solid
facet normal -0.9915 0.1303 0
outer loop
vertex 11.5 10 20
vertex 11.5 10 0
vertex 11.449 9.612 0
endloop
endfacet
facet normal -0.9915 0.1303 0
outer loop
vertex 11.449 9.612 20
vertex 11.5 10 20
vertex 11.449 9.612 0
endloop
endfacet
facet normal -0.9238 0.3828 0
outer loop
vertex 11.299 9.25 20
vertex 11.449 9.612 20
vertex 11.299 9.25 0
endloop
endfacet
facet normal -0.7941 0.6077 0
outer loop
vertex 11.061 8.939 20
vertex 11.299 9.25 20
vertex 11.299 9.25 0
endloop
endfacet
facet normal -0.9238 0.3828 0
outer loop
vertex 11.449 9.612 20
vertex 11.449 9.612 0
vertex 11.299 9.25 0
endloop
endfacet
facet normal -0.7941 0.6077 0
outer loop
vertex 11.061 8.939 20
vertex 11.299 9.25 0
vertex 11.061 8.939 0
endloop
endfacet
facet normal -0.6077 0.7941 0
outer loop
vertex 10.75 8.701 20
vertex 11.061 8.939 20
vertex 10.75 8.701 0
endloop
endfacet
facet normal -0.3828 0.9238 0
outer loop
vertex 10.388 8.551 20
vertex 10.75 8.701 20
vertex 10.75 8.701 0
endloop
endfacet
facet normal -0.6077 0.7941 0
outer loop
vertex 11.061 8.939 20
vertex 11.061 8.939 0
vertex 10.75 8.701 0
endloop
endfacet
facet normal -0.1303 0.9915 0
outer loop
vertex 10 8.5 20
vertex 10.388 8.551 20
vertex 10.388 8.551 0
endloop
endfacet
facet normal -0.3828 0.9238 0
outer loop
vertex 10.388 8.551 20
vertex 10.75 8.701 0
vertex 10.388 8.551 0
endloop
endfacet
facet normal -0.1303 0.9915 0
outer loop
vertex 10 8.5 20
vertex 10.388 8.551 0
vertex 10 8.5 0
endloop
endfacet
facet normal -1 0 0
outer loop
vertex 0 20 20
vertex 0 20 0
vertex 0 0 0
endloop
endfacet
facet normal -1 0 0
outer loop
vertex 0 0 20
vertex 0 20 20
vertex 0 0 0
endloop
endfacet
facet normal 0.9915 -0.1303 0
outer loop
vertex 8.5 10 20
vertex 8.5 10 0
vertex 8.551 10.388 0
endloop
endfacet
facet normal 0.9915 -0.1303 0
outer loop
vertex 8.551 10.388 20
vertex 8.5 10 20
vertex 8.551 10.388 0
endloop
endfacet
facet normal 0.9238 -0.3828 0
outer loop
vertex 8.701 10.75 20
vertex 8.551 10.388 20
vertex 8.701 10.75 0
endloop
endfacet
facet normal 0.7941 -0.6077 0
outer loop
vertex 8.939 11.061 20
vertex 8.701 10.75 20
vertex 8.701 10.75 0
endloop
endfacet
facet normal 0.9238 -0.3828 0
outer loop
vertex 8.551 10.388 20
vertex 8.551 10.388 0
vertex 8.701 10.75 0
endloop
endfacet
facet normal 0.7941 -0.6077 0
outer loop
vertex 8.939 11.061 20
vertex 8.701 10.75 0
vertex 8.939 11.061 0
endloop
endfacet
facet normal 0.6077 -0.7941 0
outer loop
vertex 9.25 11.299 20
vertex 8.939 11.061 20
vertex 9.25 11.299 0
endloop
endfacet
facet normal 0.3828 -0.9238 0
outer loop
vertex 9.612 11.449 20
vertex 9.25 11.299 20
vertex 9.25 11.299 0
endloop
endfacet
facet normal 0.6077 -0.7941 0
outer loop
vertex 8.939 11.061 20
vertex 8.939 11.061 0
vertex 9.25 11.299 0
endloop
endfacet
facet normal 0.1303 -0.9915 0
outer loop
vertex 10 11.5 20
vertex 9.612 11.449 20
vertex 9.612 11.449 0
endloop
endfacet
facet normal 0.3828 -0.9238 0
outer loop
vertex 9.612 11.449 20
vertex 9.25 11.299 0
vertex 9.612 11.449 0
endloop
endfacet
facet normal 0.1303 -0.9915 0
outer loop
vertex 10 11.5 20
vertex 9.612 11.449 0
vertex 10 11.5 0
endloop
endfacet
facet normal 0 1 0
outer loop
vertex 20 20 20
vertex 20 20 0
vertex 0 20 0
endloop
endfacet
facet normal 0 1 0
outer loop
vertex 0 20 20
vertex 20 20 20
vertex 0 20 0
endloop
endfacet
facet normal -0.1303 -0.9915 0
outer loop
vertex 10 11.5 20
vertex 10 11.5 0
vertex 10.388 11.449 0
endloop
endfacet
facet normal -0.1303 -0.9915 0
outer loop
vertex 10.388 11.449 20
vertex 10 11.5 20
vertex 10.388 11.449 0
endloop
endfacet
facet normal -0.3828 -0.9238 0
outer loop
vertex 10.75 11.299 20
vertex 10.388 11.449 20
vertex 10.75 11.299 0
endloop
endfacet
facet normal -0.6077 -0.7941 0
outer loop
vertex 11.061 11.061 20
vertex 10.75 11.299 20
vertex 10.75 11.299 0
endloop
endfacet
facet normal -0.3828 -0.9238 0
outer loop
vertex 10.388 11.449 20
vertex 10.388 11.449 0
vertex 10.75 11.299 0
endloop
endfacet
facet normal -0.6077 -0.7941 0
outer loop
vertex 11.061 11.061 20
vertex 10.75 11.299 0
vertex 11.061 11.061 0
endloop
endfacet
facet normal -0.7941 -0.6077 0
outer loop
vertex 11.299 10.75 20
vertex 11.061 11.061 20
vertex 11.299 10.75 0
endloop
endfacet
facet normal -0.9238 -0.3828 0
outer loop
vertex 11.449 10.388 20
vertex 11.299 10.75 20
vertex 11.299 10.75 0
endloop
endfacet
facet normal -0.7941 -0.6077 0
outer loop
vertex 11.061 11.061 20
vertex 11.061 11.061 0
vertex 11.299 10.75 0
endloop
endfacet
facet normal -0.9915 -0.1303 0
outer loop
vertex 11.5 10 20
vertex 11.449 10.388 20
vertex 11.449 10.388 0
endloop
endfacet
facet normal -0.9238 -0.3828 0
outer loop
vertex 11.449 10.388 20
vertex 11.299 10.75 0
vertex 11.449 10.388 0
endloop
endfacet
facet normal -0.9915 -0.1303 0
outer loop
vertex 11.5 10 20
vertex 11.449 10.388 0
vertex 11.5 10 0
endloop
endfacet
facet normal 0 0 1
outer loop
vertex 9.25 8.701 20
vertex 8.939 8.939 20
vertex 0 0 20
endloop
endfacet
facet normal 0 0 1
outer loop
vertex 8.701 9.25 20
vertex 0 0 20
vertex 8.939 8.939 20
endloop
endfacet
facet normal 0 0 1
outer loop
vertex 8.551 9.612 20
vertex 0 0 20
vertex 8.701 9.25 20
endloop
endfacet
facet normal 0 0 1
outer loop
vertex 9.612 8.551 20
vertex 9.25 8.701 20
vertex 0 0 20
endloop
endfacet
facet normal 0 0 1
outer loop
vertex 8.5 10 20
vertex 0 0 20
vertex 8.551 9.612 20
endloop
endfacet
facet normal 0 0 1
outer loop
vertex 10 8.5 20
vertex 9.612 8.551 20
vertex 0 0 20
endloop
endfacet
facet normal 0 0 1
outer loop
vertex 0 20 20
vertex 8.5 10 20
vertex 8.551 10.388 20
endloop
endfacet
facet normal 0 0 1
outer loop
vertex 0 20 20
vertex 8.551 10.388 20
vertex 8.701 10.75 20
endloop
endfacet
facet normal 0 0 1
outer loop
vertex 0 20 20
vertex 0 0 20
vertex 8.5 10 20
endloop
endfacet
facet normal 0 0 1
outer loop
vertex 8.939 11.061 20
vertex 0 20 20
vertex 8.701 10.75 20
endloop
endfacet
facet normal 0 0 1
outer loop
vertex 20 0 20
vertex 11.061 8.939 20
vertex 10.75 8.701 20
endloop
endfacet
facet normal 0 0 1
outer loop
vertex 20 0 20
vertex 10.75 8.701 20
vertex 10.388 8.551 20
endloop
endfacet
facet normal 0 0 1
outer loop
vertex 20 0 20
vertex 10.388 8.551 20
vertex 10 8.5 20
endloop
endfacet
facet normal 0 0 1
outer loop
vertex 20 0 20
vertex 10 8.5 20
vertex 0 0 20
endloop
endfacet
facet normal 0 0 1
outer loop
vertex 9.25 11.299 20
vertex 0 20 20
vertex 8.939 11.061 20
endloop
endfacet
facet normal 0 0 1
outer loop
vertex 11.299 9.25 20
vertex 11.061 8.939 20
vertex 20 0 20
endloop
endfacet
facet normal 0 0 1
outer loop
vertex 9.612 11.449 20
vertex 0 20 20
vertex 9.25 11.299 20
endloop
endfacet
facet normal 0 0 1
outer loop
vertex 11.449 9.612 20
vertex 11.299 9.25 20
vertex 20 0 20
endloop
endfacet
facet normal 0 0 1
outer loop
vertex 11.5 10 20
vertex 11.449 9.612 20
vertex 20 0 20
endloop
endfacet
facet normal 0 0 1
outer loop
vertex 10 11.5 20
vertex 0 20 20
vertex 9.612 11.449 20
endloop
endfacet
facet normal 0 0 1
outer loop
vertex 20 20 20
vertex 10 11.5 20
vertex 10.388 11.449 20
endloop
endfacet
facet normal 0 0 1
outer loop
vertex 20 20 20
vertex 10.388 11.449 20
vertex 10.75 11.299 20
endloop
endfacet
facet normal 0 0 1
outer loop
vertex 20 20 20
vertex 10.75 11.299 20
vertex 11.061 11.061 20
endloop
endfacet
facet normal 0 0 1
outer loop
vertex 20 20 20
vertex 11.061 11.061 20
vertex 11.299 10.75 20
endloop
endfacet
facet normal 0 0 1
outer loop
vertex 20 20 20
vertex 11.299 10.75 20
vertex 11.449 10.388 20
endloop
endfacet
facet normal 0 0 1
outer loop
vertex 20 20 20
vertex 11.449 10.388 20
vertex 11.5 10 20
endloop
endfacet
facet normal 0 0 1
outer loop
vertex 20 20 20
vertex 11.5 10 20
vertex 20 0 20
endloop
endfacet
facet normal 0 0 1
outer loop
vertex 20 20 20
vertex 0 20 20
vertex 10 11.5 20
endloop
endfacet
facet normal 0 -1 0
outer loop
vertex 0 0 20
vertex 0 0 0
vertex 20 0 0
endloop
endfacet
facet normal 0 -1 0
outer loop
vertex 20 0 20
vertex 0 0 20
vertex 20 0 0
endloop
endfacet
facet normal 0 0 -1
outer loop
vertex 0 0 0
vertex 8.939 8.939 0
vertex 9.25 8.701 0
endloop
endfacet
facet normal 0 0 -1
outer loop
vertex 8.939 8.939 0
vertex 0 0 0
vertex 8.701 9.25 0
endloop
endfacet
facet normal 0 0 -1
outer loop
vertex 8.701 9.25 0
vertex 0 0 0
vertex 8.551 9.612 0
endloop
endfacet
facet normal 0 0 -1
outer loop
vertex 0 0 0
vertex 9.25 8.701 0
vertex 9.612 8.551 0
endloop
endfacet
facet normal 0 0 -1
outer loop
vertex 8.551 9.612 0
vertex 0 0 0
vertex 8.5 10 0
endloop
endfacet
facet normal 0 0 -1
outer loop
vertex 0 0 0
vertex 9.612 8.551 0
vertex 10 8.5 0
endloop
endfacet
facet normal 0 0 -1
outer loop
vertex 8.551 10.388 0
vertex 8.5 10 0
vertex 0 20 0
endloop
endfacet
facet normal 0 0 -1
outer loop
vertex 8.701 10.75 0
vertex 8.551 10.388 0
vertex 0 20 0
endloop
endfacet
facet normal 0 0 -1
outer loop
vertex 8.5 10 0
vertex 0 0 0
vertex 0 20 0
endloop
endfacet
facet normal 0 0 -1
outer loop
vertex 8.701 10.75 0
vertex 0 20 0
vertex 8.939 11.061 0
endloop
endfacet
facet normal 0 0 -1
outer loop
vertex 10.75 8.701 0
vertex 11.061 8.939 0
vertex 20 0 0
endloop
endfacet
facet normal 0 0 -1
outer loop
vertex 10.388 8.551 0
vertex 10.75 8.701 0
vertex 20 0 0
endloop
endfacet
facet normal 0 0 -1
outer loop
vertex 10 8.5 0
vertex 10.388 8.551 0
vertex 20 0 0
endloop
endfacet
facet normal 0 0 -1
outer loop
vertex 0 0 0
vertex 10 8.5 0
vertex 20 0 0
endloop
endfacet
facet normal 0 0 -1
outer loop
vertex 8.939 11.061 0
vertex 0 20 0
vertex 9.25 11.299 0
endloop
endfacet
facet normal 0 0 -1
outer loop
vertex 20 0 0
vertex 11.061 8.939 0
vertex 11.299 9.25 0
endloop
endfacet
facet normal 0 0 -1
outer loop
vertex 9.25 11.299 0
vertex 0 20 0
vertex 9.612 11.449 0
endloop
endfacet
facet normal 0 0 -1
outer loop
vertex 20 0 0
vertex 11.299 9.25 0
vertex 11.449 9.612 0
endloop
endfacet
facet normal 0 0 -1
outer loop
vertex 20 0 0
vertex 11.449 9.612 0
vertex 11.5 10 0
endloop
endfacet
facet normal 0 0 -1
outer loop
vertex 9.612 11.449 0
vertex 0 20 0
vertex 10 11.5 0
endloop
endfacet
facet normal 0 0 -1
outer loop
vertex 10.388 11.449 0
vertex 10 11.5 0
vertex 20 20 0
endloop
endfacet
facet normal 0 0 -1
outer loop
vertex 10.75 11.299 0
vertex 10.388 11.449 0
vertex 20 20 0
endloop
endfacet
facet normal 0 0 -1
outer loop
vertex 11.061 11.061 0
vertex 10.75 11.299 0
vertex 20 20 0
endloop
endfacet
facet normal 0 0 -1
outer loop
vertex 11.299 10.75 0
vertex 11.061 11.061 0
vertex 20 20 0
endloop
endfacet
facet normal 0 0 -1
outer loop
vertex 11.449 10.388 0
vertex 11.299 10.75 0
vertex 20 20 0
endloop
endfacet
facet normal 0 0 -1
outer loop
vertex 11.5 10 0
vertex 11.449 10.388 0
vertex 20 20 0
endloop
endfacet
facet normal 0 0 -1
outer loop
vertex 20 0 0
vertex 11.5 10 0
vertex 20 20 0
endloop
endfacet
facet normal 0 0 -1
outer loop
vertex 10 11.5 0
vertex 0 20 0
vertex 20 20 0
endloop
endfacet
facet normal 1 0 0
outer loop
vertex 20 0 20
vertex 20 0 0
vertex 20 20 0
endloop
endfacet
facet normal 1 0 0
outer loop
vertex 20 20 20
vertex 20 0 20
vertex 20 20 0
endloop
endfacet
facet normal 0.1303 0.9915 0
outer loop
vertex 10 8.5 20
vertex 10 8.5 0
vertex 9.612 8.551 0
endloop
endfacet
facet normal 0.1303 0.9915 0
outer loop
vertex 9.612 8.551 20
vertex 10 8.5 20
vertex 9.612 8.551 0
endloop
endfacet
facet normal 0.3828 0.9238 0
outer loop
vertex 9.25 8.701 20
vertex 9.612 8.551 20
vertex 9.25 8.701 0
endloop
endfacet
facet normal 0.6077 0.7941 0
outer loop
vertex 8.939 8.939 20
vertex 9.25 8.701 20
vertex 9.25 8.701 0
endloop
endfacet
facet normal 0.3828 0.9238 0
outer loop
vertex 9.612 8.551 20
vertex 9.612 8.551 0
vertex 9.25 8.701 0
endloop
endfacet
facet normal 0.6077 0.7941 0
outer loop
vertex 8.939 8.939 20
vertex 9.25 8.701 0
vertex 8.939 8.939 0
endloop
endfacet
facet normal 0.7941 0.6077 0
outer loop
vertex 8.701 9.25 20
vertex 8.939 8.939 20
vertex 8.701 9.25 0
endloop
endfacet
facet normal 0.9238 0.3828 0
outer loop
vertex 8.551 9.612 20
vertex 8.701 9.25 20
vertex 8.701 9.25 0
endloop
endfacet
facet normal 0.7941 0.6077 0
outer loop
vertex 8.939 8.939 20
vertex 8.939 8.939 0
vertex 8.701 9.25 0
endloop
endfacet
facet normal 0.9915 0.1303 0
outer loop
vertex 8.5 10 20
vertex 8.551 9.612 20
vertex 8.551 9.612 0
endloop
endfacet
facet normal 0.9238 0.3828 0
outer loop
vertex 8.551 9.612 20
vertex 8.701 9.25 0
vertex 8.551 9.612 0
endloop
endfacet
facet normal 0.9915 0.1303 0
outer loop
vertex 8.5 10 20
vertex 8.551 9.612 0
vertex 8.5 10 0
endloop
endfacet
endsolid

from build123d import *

# Parameters (mm, degrees)
F1_DEPTH = 20


with BuildPart() as f1:
    # F0 (on Top) → F1 (new body)
    with BuildSketch(Plane.XY):
        with BuildLine():
            Line((0, 10), (0, 0))
            Line((0, 0), (10, 0))
            Line((10, 0), (10, 8.5))
            ThreePointArc((10, 8.5), (8.93934, 8.93934), (8.5, 10))
            Line((8.5, 10), (0, 10))
        make_face()
        with BuildLine():
            Line((10, 8.5), (10, 0))
            Line((10, 0), (20, 0))
            Line((20, 0), (20, 10))
            Line((20, 10), (11.5, 10))
            ThreePointArc((11.5, 10), (11.06066, 8.93934), (10, 8.5))
        make_face()
        with BuildLine():
            Line((0, 20), (0, 10))
            Line((0, 10), (8.5, 10))
            ThreePointArc((8.5, 10), (8.93934, 11.06066), (10, 11.5))
            Line((10, 11.5), (10, 20))
            Line((10, 20), (0, 20))
        make_face()
        with BuildLine():
            Line((11.5, 10), (20, 10))
            Line((20, 10), (20, 20))
            Line((20, 20), (10, 20))
            Line((10, 20), (10, 11.5))
            ThreePointArc((10, 11.5), (11.06066, 11.06066), (11.5, 10))
        make_face()
    extrude(amount=F1_DEPTH)


solid = f1.part
